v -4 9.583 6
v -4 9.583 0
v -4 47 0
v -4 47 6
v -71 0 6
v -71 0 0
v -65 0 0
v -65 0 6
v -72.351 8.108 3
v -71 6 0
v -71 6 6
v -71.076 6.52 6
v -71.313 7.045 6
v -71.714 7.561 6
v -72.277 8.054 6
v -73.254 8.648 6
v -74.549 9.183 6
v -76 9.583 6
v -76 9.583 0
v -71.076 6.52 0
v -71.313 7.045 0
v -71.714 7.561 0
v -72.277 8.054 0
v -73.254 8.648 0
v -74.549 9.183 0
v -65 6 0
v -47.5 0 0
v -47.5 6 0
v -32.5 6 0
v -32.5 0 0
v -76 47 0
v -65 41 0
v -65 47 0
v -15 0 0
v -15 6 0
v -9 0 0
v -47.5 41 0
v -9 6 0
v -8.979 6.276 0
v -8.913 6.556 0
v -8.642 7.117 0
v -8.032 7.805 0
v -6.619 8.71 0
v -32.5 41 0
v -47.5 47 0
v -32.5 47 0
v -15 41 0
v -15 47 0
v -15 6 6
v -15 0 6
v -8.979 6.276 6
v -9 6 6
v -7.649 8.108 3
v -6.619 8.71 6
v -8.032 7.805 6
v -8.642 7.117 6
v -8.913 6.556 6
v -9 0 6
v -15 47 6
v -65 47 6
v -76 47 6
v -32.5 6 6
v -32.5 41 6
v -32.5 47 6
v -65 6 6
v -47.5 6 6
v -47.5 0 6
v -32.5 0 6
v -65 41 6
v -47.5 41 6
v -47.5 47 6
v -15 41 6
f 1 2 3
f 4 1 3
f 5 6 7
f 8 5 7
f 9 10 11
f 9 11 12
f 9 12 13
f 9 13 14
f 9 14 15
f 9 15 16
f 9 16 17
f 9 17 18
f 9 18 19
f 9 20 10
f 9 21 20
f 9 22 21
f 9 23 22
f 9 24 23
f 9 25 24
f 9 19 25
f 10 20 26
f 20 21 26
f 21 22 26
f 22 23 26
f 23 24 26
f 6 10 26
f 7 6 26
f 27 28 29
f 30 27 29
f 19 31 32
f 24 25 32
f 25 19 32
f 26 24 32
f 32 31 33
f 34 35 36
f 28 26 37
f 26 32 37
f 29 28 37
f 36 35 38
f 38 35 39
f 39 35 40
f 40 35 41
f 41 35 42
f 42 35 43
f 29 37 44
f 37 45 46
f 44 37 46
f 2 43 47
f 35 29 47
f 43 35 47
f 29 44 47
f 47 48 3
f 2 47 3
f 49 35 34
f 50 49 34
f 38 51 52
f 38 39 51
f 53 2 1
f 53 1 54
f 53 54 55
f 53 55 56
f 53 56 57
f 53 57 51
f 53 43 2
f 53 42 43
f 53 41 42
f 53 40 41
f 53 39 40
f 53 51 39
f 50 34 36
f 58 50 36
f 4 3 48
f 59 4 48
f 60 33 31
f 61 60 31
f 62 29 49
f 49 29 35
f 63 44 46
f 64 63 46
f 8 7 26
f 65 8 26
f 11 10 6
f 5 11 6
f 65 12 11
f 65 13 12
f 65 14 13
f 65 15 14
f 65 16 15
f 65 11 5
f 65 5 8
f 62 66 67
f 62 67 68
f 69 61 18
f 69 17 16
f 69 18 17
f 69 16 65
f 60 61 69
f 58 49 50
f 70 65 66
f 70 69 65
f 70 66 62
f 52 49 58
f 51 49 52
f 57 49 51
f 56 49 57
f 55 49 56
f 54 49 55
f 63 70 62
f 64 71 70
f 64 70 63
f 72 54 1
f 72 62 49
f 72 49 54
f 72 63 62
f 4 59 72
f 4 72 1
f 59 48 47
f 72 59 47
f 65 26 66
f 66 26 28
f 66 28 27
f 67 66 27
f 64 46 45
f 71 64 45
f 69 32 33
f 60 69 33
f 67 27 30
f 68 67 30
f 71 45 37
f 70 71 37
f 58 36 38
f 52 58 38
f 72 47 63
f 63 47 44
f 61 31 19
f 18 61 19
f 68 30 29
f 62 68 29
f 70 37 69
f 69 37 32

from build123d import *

# Parameters (mm, degrees)
BOSS_EXTRUDE1_DEPTH = 6


with BuildPart() as part:
    # Sketch2 → Boss-Extrude1 (new body)
    with BuildSketch(Plane.XY):
        with BuildLine():
            Line((-15, 0), (-9, 0))
            Line((-9, 0), (-9, 6))
            add(Edge.make_bspline(
                [(-4, 9.583225666), (-9, 8.480694692), (-9, 6)],
                knots=[5.172942972, 5.172942972, 5.172942972, 6.283185307, 6.283185307, 6.283185307], degree=2, weights=[1, 0.849836586, 1]))
            Line((-4, 9.583225666), (-4, 41))
            Line((-4, 41), (-4, 47))
            Line((-4, 47), (-15, 47))
            Line((-15, 47), (-15, 41))
            Line((-15, 41), (-32.5, 41))
            Line((-32.5, 41), (-32.5, 47))
            Line((-32.5, 47), (-47.5, 47))
            Line((-47.5, 47), (-47.5, 41))
            Line((-47.5, 41), (-65, 41))
            Line((-65, 41), (-65, 47))
            Line((-65, 47), (-76, 47))
            Line((-76, 47), (-76, 41))
            Line((-76, 41), (-76, 9.583225666))
            add(Edge.make_bspline(
                [(-71, 6), (-71, 8.480694692), (-76, 9.583225666)],
                knots=[0, 0, 0, 1.110242335, 1.110242335, 1.110242335], degree=2, weights=[1, 0.849836586, 1]))
            Line((-71, 6), (-71, 0))
            Line((-71, 0), (-65, 0))
            Line((-65, 0), (-65, 6))
            Line((-65, 6), (-47.5, 6))
            Line((-47.5, 6), (-47.5, 0))
            Line((-47.5, 0), (-32.5, 0))
            Line((-32.5, 0), (-32.5, 6))
            Line((-32.5, 6), (-15, 6))
            Line((-15, 6), (-15, 0))
        make_face()
    extrude(amount=BOSS_EXTRUDE1_DEPTH)


solid = part.part
